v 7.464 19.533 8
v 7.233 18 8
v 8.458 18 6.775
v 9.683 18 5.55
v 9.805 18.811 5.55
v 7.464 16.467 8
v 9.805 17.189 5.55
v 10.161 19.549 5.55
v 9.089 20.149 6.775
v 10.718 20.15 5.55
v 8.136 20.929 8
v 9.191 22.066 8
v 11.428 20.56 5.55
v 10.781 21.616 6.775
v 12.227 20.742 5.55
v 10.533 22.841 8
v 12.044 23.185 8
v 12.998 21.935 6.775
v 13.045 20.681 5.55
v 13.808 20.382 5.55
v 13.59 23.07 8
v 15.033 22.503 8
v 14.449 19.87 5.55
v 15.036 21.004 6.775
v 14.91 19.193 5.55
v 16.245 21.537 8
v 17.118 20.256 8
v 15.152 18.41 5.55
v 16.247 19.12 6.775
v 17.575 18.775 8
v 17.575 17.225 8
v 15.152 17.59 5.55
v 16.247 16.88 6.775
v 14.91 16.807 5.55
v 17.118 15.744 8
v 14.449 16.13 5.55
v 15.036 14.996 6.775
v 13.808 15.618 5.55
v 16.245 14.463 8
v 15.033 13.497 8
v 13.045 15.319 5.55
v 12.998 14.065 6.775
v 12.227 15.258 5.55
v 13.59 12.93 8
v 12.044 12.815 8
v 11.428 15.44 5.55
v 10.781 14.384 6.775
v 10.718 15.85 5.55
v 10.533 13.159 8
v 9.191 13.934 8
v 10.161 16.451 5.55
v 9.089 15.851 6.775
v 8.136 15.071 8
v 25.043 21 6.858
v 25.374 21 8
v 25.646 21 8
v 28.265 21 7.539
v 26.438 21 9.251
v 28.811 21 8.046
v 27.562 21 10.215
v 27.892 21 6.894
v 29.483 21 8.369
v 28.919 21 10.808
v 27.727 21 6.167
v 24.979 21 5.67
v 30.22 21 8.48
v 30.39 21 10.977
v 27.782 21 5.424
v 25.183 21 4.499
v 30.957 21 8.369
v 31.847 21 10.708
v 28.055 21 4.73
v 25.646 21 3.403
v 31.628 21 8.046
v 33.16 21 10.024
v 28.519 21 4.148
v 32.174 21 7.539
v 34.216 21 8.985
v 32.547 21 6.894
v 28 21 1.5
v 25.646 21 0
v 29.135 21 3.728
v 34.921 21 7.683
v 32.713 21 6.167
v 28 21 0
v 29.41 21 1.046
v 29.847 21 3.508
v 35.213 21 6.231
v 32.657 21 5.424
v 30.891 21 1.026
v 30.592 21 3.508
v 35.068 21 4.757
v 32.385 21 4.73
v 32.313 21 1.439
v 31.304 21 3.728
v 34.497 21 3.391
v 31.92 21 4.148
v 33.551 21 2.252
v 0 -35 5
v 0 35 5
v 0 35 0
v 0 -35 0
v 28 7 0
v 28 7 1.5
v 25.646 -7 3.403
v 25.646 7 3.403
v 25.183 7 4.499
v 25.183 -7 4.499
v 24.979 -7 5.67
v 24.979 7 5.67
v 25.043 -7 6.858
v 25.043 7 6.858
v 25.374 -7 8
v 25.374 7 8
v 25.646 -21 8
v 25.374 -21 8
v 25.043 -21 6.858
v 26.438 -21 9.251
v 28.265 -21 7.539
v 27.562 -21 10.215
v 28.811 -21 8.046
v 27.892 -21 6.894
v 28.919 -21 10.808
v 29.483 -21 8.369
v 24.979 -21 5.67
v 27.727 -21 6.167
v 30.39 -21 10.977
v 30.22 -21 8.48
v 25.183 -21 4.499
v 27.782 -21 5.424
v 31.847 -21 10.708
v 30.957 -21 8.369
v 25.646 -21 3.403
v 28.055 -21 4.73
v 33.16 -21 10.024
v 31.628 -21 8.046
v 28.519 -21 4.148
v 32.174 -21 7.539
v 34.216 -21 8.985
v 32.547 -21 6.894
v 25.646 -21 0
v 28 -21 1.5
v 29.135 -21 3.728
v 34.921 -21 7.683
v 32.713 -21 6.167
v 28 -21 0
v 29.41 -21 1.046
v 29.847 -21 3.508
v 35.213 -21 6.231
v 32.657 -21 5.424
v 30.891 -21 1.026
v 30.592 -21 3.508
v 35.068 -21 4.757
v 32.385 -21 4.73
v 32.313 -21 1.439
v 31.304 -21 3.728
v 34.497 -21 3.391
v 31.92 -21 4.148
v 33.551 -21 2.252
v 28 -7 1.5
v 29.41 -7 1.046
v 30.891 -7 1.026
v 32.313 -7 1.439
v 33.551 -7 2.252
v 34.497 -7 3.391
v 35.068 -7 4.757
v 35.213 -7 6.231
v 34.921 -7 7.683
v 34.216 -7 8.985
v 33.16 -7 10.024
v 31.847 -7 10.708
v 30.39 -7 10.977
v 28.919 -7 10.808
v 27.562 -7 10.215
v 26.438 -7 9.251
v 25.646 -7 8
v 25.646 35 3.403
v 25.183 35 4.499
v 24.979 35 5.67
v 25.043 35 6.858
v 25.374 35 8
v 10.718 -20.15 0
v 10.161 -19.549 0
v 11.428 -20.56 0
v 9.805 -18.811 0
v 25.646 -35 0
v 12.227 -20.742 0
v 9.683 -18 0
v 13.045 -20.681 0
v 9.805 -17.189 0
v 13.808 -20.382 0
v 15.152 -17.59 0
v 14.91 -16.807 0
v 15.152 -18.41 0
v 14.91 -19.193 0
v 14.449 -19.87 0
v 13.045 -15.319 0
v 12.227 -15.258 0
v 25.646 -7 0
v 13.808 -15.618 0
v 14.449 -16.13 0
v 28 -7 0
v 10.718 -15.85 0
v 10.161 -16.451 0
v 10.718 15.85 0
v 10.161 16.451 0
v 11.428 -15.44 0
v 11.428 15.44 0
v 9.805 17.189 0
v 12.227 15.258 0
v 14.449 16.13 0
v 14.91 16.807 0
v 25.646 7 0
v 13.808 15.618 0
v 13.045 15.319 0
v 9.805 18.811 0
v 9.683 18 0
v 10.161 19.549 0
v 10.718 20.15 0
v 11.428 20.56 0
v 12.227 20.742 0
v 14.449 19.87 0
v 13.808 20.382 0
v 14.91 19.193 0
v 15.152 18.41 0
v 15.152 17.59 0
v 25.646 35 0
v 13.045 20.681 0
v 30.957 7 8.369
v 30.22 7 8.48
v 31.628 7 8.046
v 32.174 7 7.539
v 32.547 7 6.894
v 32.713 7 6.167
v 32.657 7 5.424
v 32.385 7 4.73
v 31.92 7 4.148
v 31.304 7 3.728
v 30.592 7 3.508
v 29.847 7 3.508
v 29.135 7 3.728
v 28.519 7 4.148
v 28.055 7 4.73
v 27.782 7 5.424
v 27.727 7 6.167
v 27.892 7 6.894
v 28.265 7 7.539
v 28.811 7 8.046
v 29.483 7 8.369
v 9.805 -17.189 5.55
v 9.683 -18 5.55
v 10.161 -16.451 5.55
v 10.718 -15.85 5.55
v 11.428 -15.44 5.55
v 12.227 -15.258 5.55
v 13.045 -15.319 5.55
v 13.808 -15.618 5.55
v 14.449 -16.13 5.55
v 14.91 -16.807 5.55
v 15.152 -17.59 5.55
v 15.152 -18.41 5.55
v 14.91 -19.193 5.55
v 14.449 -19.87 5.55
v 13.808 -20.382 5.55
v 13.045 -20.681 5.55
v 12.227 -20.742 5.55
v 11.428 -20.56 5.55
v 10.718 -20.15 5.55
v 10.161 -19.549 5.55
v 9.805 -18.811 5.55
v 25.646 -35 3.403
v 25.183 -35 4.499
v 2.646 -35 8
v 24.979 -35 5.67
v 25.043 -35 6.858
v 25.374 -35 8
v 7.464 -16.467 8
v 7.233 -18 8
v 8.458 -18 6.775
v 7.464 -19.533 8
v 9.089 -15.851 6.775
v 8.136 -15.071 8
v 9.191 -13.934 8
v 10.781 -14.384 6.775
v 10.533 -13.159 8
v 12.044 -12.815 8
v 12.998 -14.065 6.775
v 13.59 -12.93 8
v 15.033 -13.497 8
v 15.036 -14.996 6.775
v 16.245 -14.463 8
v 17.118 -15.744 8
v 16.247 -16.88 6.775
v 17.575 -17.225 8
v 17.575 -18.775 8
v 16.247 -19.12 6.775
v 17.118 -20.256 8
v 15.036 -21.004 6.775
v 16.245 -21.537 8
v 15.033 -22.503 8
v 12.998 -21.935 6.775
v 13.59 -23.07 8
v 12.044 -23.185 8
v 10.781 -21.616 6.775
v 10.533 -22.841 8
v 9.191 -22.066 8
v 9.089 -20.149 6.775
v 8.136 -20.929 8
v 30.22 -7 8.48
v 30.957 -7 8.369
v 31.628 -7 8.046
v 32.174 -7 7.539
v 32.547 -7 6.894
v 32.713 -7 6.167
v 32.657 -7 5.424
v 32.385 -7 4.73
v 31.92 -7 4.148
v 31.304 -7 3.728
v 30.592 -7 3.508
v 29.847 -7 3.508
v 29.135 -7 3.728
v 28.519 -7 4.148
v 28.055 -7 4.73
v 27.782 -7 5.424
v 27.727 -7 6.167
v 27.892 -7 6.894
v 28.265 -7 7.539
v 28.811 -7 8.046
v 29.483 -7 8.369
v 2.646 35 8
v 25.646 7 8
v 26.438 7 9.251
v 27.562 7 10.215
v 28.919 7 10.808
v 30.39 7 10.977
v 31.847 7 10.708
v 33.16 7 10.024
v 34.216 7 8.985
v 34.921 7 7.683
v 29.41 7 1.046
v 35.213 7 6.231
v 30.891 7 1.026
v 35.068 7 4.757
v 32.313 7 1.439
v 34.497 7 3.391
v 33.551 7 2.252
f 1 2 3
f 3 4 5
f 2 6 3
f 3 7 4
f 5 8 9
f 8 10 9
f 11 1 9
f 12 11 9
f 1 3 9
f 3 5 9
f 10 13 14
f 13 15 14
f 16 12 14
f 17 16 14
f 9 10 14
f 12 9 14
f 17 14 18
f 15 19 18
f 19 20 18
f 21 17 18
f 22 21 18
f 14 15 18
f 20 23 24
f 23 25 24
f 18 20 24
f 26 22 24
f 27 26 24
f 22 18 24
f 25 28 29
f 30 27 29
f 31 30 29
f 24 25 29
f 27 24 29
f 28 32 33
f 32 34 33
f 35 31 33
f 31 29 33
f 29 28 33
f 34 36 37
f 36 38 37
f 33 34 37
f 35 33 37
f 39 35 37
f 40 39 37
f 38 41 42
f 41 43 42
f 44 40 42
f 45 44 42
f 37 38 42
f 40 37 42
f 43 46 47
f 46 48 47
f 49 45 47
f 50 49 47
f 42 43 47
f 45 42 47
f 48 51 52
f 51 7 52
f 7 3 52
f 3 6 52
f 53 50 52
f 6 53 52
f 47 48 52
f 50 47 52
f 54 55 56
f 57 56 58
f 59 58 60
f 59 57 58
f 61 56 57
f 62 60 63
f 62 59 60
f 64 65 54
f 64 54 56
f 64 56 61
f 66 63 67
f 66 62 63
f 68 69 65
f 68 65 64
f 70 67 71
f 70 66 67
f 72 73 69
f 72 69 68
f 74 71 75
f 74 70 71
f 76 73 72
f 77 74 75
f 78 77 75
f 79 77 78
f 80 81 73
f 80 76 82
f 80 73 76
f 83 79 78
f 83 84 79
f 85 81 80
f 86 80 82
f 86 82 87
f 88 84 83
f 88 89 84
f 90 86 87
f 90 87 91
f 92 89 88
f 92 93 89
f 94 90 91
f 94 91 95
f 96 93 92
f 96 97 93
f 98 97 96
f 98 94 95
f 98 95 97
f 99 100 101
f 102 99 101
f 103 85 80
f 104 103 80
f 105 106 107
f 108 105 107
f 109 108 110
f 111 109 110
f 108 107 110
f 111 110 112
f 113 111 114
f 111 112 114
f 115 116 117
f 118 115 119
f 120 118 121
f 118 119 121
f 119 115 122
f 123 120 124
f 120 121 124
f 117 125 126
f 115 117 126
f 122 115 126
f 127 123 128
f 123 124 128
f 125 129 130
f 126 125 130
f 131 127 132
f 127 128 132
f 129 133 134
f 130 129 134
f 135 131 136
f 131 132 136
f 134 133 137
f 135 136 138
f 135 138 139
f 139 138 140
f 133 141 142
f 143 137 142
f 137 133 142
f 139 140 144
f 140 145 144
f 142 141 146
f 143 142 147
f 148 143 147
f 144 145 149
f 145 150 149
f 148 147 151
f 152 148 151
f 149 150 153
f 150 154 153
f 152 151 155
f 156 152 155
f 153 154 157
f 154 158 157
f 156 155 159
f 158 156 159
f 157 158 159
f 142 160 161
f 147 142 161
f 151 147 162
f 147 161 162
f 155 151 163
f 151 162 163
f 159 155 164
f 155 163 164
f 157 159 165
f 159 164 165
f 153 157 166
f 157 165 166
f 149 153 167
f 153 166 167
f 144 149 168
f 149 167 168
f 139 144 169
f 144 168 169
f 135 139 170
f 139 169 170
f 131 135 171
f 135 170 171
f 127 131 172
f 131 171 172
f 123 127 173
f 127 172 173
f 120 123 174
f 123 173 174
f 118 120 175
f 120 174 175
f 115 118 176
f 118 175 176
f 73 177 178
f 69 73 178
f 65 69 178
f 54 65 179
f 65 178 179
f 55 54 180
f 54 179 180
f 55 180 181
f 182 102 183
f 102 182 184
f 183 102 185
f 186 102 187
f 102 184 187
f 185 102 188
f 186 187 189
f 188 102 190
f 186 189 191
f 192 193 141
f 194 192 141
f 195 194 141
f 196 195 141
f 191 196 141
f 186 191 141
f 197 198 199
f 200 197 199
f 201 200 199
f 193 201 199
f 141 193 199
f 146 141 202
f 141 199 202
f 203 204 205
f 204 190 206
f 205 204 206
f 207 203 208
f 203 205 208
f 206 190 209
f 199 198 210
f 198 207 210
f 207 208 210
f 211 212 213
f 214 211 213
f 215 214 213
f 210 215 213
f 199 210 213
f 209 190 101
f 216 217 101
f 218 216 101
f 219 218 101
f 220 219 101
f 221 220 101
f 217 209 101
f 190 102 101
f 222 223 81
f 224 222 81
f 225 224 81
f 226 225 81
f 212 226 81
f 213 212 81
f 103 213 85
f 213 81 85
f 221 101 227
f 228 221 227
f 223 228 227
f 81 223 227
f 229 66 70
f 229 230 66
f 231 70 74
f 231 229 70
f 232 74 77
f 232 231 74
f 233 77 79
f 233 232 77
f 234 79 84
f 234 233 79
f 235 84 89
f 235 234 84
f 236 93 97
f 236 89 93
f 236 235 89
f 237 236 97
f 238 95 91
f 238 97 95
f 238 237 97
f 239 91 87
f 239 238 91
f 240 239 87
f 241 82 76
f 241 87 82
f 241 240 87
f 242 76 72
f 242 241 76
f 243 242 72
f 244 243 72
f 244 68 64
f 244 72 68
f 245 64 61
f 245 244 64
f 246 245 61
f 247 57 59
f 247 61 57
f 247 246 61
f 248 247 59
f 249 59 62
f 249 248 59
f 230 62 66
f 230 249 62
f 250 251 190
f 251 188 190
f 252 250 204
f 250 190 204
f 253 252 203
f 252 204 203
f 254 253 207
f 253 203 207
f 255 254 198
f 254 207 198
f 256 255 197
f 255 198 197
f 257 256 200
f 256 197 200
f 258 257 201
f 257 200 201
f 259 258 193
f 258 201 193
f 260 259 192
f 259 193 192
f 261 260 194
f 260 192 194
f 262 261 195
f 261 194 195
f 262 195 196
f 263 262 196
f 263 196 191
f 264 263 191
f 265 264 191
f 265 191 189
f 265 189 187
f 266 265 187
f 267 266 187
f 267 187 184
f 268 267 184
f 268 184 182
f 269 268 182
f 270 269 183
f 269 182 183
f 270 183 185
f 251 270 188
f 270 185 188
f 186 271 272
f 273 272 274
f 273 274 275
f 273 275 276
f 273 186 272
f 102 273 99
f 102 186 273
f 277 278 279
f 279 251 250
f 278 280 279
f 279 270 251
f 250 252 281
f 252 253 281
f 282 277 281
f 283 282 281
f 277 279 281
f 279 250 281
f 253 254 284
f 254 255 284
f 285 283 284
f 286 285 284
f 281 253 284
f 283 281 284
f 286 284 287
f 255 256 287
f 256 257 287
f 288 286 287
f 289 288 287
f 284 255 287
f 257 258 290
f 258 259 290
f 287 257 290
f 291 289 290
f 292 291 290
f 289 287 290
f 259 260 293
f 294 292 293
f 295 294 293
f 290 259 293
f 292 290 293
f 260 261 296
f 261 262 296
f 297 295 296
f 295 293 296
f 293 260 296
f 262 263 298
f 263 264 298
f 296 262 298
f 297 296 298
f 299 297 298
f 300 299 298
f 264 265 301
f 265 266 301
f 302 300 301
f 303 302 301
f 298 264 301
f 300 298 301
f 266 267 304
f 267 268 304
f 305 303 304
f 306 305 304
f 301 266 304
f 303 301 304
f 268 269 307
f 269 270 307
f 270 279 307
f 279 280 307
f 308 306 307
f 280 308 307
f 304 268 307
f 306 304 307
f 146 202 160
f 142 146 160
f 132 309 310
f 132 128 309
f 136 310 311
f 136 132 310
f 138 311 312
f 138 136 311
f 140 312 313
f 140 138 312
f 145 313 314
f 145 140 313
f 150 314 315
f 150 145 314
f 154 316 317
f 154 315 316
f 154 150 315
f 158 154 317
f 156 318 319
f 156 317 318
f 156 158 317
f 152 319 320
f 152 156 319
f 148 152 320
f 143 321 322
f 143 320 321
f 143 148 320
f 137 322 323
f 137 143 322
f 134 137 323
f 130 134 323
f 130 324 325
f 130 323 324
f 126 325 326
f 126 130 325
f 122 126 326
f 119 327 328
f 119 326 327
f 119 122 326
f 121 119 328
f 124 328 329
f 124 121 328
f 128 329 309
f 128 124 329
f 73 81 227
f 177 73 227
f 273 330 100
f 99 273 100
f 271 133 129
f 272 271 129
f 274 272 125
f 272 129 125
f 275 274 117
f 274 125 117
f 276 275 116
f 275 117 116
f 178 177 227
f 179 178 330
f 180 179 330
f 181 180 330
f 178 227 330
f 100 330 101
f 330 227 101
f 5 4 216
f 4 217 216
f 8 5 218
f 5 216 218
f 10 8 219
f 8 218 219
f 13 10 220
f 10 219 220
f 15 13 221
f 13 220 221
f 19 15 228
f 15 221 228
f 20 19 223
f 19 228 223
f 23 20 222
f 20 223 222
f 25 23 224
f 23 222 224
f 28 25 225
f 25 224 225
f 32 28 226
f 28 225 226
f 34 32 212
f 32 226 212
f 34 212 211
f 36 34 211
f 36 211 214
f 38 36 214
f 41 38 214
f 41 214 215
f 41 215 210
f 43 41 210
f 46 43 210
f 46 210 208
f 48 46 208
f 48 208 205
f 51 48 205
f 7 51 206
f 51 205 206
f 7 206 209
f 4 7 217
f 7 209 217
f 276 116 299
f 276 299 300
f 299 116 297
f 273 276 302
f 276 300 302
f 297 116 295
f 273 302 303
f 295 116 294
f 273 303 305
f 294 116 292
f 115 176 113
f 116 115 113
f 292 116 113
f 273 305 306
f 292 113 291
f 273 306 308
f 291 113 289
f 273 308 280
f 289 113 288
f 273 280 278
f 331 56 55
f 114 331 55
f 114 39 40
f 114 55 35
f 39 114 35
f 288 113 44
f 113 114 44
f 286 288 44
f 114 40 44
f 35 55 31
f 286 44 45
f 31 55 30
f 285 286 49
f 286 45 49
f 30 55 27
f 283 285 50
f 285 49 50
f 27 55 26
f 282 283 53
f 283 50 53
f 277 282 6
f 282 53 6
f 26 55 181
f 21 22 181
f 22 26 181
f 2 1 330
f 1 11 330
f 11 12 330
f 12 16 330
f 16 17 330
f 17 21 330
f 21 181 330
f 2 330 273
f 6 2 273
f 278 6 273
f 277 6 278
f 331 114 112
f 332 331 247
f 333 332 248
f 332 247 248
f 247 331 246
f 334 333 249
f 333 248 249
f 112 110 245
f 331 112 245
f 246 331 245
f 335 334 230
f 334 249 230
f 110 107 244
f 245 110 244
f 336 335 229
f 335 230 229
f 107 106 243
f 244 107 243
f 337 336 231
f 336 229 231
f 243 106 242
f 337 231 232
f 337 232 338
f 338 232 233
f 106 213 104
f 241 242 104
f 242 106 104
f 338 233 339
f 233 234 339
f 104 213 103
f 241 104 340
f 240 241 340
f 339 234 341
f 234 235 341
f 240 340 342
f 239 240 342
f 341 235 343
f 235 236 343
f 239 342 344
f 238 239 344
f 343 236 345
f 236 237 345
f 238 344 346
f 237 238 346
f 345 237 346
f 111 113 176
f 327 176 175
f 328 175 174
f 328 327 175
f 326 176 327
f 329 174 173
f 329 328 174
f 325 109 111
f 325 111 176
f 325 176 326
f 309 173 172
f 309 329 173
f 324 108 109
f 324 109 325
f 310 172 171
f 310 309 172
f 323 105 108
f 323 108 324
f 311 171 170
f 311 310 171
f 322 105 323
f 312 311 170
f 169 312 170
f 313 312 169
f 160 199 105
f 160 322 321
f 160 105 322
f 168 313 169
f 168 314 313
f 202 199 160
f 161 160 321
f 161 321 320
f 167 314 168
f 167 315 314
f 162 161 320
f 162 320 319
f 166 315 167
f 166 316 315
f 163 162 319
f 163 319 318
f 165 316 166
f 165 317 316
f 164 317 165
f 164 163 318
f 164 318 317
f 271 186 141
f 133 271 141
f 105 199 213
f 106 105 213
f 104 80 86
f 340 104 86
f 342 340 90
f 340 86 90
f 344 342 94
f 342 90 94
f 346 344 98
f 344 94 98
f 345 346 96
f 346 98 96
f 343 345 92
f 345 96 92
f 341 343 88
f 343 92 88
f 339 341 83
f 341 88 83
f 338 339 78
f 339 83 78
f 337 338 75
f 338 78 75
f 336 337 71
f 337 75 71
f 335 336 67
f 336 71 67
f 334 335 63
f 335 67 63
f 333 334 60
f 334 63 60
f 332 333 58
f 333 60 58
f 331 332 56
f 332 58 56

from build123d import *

# Parameters (mm, degrees)
SKETCH1_R                                       = 2.5
BOSS_EXTRUDE1_DEPTH                             = 35
CUT_EXTRUDE1_OUTLINE_W                          = 11.354248689
CUT_EXTRUDE1_OUTLINE_H                          = 14
CUT_EXTRUDE1_DEPTH                              = 10.980294351
CSK_FOR_M5_FLAT_HEAD_MACHINE_SCREW1_D           = 5.5
CSK_FOR_M5_FLAT_HEAD_MACHINE_SCREW1_DEPTH       = 13.347633298
CSK_FOR_M5_FLAT_HEAD_MACHINE_SCREW1_CSINK_D     = 10.4
CSK_FOR_M5_FLAT_HEAD_MACHINE_SCREW1_CSINK_ANGLE = 90
CSK_FOR_M5_FLAT_HEAD_MACHINE_SCREW1_TIP         = 1.652366702
SKETCH6_R                                       = 5.25
CUT_EXTRUDE2_DEPTH                              = 14
CUT_EXTRUDE3_START                              = -28
SKETCH6_2_R                                     = 5.25
CUT_EXTRUDE3_DEPTH                              = 14
CUT_EXTRUDE4_START                              = -56
SKETCH6_3_R                                     = 5.25
CUT_EXTRUDE4_DEPTH                              = 14


# Read off the part's stored shape, not the designer's step: Cut-Extrude1
with BuildPart() as part:
    # Sketch1 → Boss-Extrude1 (new, symmetric)
    with BuildSketch(Plane(origin=(0, 0, 0), x_dir=(1, 0, 0), z_dir=(0, 1, 0))):
        with BuildLine():
            Line((0, 0), (28, 0))
            Line((28, 0), (28, -1.5))
            ThreePointArc((28, -1.5), (34.920820135, -7.683011565), (25.645751311, -8))
            Line((25.645751311, -8), (2.645751311, -8))
            Line((2.645751311, -8), (0, -5))
            Line((0, -5), (0, 0))
        make_face()
        with Locations(Location((30.219676222, -5.980294351, 0), (0, 0, 270))):
            Circle(SKETCH1_R, mode=Mode.SUBTRACT)
    extrude(amount=BOSS_EXTRUDE1_DEPTH, both=True)

    # Cut-Extrude1 outline → Cut-Extrude1 (cut)
    with BuildSketch(Plane.XY):
        with Locations((31.322875655, 0)):
            Rectangle(CUT_EXTRUDE1_OUTLINE_W, CUT_EXTRUDE1_OUTLINE_H)
        with Locations((31.322875655, 28)):
            Rectangle(CUT_EXTRUDE1_OUTLINE_W, CUT_EXTRUDE1_OUTLINE_H)
        with Locations((31.322875655, -28)):
            Rectangle(CUT_EXTRUDE1_OUTLINE_W, CUT_EXTRUDE1_OUTLINE_H)
    extrude(amount=CUT_EXTRUDE1_DEPTH, mode=Mode.SUBTRACT)

    # CSK for M5 Flat Head Machine Screw1
    with Locations(Plane.XY.offset(8)):
        with Locations((12.432713767, 18), (12.432713767, -18)):
            CounterSinkHole(CSK_FOR_M5_FLAT_HEAD_MACHINE_SCREW1_D / 2, CSK_FOR_M5_FLAT_HEAD_MACHINE_SCREW1_CSINK_D / 2, depth=CSK_FOR_M5_FLAT_HEAD_MACHINE_SCREW1_DEPTH, counter_sink_angle=CSK_FOR_M5_FLAT_HEAD_MACHINE_SCREW1_CSINK_ANGLE)
            with Locations((0, 0, -(CSK_FOR_M5_FLAT_HEAD_MACHINE_SCREW1_DEPTH + CSK_FOR_M5_FLAT_HEAD_MACHINE_SCREW1_TIP / 2))):  # 118° drill point
                Cone(0, CSK_FOR_M5_FLAT_HEAD_MACHINE_SCREW1_D / 2, CSK_FOR_M5_FLAT_HEAD_MACHINE_SCREW1_TIP, mode=Mode.SUBTRACT)

    # Sketch6 → Cut-Extrude2 (cut)
    with BuildSketch(Plane(origin=(0, 35, 0), x_dir=(1, 0, 0), z_dir=(0, 1, 0))):
        with Locations((30.219676222, -5.980294351)):
            Circle(SKETCH6_R)
    extrude(amount=-CUT_EXTRUDE2_DEPTH, mode=Mode.SUBTRACT)

    # Sketch6<2> → Cut-Extrude3 (cut)
    with BuildSketch(Plane(origin=(0, 35, 0), x_dir=(1, 0, 0), z_dir=(0, 1, 0)).offset(CUT_EXTRUDE3_START)):
        with Locations((30.219676222, -5.980294351)):
            Circle(SKETCH6_2_R)
    extrude(amount=-CUT_EXTRUDE3_DEPTH, mode=Mode.SUBTRACT)

    # Sketch6<3> → Cut-Extrude4 (cut)
    with BuildSketch(Plane(origin=(0, 35, 0), x_dir=(1, 0, 0), z_dir=(0, 1, 0)).offset(CUT_EXTRUDE4_START)):
        with Locations((30.219676222, -5.980294351)):
            Circle(SKETCH6_3_R)
    extrude(amount=-CUT_EXTRUDE4_DEPTH, mode=Mode.SUBTRACT)


solid = part.part
